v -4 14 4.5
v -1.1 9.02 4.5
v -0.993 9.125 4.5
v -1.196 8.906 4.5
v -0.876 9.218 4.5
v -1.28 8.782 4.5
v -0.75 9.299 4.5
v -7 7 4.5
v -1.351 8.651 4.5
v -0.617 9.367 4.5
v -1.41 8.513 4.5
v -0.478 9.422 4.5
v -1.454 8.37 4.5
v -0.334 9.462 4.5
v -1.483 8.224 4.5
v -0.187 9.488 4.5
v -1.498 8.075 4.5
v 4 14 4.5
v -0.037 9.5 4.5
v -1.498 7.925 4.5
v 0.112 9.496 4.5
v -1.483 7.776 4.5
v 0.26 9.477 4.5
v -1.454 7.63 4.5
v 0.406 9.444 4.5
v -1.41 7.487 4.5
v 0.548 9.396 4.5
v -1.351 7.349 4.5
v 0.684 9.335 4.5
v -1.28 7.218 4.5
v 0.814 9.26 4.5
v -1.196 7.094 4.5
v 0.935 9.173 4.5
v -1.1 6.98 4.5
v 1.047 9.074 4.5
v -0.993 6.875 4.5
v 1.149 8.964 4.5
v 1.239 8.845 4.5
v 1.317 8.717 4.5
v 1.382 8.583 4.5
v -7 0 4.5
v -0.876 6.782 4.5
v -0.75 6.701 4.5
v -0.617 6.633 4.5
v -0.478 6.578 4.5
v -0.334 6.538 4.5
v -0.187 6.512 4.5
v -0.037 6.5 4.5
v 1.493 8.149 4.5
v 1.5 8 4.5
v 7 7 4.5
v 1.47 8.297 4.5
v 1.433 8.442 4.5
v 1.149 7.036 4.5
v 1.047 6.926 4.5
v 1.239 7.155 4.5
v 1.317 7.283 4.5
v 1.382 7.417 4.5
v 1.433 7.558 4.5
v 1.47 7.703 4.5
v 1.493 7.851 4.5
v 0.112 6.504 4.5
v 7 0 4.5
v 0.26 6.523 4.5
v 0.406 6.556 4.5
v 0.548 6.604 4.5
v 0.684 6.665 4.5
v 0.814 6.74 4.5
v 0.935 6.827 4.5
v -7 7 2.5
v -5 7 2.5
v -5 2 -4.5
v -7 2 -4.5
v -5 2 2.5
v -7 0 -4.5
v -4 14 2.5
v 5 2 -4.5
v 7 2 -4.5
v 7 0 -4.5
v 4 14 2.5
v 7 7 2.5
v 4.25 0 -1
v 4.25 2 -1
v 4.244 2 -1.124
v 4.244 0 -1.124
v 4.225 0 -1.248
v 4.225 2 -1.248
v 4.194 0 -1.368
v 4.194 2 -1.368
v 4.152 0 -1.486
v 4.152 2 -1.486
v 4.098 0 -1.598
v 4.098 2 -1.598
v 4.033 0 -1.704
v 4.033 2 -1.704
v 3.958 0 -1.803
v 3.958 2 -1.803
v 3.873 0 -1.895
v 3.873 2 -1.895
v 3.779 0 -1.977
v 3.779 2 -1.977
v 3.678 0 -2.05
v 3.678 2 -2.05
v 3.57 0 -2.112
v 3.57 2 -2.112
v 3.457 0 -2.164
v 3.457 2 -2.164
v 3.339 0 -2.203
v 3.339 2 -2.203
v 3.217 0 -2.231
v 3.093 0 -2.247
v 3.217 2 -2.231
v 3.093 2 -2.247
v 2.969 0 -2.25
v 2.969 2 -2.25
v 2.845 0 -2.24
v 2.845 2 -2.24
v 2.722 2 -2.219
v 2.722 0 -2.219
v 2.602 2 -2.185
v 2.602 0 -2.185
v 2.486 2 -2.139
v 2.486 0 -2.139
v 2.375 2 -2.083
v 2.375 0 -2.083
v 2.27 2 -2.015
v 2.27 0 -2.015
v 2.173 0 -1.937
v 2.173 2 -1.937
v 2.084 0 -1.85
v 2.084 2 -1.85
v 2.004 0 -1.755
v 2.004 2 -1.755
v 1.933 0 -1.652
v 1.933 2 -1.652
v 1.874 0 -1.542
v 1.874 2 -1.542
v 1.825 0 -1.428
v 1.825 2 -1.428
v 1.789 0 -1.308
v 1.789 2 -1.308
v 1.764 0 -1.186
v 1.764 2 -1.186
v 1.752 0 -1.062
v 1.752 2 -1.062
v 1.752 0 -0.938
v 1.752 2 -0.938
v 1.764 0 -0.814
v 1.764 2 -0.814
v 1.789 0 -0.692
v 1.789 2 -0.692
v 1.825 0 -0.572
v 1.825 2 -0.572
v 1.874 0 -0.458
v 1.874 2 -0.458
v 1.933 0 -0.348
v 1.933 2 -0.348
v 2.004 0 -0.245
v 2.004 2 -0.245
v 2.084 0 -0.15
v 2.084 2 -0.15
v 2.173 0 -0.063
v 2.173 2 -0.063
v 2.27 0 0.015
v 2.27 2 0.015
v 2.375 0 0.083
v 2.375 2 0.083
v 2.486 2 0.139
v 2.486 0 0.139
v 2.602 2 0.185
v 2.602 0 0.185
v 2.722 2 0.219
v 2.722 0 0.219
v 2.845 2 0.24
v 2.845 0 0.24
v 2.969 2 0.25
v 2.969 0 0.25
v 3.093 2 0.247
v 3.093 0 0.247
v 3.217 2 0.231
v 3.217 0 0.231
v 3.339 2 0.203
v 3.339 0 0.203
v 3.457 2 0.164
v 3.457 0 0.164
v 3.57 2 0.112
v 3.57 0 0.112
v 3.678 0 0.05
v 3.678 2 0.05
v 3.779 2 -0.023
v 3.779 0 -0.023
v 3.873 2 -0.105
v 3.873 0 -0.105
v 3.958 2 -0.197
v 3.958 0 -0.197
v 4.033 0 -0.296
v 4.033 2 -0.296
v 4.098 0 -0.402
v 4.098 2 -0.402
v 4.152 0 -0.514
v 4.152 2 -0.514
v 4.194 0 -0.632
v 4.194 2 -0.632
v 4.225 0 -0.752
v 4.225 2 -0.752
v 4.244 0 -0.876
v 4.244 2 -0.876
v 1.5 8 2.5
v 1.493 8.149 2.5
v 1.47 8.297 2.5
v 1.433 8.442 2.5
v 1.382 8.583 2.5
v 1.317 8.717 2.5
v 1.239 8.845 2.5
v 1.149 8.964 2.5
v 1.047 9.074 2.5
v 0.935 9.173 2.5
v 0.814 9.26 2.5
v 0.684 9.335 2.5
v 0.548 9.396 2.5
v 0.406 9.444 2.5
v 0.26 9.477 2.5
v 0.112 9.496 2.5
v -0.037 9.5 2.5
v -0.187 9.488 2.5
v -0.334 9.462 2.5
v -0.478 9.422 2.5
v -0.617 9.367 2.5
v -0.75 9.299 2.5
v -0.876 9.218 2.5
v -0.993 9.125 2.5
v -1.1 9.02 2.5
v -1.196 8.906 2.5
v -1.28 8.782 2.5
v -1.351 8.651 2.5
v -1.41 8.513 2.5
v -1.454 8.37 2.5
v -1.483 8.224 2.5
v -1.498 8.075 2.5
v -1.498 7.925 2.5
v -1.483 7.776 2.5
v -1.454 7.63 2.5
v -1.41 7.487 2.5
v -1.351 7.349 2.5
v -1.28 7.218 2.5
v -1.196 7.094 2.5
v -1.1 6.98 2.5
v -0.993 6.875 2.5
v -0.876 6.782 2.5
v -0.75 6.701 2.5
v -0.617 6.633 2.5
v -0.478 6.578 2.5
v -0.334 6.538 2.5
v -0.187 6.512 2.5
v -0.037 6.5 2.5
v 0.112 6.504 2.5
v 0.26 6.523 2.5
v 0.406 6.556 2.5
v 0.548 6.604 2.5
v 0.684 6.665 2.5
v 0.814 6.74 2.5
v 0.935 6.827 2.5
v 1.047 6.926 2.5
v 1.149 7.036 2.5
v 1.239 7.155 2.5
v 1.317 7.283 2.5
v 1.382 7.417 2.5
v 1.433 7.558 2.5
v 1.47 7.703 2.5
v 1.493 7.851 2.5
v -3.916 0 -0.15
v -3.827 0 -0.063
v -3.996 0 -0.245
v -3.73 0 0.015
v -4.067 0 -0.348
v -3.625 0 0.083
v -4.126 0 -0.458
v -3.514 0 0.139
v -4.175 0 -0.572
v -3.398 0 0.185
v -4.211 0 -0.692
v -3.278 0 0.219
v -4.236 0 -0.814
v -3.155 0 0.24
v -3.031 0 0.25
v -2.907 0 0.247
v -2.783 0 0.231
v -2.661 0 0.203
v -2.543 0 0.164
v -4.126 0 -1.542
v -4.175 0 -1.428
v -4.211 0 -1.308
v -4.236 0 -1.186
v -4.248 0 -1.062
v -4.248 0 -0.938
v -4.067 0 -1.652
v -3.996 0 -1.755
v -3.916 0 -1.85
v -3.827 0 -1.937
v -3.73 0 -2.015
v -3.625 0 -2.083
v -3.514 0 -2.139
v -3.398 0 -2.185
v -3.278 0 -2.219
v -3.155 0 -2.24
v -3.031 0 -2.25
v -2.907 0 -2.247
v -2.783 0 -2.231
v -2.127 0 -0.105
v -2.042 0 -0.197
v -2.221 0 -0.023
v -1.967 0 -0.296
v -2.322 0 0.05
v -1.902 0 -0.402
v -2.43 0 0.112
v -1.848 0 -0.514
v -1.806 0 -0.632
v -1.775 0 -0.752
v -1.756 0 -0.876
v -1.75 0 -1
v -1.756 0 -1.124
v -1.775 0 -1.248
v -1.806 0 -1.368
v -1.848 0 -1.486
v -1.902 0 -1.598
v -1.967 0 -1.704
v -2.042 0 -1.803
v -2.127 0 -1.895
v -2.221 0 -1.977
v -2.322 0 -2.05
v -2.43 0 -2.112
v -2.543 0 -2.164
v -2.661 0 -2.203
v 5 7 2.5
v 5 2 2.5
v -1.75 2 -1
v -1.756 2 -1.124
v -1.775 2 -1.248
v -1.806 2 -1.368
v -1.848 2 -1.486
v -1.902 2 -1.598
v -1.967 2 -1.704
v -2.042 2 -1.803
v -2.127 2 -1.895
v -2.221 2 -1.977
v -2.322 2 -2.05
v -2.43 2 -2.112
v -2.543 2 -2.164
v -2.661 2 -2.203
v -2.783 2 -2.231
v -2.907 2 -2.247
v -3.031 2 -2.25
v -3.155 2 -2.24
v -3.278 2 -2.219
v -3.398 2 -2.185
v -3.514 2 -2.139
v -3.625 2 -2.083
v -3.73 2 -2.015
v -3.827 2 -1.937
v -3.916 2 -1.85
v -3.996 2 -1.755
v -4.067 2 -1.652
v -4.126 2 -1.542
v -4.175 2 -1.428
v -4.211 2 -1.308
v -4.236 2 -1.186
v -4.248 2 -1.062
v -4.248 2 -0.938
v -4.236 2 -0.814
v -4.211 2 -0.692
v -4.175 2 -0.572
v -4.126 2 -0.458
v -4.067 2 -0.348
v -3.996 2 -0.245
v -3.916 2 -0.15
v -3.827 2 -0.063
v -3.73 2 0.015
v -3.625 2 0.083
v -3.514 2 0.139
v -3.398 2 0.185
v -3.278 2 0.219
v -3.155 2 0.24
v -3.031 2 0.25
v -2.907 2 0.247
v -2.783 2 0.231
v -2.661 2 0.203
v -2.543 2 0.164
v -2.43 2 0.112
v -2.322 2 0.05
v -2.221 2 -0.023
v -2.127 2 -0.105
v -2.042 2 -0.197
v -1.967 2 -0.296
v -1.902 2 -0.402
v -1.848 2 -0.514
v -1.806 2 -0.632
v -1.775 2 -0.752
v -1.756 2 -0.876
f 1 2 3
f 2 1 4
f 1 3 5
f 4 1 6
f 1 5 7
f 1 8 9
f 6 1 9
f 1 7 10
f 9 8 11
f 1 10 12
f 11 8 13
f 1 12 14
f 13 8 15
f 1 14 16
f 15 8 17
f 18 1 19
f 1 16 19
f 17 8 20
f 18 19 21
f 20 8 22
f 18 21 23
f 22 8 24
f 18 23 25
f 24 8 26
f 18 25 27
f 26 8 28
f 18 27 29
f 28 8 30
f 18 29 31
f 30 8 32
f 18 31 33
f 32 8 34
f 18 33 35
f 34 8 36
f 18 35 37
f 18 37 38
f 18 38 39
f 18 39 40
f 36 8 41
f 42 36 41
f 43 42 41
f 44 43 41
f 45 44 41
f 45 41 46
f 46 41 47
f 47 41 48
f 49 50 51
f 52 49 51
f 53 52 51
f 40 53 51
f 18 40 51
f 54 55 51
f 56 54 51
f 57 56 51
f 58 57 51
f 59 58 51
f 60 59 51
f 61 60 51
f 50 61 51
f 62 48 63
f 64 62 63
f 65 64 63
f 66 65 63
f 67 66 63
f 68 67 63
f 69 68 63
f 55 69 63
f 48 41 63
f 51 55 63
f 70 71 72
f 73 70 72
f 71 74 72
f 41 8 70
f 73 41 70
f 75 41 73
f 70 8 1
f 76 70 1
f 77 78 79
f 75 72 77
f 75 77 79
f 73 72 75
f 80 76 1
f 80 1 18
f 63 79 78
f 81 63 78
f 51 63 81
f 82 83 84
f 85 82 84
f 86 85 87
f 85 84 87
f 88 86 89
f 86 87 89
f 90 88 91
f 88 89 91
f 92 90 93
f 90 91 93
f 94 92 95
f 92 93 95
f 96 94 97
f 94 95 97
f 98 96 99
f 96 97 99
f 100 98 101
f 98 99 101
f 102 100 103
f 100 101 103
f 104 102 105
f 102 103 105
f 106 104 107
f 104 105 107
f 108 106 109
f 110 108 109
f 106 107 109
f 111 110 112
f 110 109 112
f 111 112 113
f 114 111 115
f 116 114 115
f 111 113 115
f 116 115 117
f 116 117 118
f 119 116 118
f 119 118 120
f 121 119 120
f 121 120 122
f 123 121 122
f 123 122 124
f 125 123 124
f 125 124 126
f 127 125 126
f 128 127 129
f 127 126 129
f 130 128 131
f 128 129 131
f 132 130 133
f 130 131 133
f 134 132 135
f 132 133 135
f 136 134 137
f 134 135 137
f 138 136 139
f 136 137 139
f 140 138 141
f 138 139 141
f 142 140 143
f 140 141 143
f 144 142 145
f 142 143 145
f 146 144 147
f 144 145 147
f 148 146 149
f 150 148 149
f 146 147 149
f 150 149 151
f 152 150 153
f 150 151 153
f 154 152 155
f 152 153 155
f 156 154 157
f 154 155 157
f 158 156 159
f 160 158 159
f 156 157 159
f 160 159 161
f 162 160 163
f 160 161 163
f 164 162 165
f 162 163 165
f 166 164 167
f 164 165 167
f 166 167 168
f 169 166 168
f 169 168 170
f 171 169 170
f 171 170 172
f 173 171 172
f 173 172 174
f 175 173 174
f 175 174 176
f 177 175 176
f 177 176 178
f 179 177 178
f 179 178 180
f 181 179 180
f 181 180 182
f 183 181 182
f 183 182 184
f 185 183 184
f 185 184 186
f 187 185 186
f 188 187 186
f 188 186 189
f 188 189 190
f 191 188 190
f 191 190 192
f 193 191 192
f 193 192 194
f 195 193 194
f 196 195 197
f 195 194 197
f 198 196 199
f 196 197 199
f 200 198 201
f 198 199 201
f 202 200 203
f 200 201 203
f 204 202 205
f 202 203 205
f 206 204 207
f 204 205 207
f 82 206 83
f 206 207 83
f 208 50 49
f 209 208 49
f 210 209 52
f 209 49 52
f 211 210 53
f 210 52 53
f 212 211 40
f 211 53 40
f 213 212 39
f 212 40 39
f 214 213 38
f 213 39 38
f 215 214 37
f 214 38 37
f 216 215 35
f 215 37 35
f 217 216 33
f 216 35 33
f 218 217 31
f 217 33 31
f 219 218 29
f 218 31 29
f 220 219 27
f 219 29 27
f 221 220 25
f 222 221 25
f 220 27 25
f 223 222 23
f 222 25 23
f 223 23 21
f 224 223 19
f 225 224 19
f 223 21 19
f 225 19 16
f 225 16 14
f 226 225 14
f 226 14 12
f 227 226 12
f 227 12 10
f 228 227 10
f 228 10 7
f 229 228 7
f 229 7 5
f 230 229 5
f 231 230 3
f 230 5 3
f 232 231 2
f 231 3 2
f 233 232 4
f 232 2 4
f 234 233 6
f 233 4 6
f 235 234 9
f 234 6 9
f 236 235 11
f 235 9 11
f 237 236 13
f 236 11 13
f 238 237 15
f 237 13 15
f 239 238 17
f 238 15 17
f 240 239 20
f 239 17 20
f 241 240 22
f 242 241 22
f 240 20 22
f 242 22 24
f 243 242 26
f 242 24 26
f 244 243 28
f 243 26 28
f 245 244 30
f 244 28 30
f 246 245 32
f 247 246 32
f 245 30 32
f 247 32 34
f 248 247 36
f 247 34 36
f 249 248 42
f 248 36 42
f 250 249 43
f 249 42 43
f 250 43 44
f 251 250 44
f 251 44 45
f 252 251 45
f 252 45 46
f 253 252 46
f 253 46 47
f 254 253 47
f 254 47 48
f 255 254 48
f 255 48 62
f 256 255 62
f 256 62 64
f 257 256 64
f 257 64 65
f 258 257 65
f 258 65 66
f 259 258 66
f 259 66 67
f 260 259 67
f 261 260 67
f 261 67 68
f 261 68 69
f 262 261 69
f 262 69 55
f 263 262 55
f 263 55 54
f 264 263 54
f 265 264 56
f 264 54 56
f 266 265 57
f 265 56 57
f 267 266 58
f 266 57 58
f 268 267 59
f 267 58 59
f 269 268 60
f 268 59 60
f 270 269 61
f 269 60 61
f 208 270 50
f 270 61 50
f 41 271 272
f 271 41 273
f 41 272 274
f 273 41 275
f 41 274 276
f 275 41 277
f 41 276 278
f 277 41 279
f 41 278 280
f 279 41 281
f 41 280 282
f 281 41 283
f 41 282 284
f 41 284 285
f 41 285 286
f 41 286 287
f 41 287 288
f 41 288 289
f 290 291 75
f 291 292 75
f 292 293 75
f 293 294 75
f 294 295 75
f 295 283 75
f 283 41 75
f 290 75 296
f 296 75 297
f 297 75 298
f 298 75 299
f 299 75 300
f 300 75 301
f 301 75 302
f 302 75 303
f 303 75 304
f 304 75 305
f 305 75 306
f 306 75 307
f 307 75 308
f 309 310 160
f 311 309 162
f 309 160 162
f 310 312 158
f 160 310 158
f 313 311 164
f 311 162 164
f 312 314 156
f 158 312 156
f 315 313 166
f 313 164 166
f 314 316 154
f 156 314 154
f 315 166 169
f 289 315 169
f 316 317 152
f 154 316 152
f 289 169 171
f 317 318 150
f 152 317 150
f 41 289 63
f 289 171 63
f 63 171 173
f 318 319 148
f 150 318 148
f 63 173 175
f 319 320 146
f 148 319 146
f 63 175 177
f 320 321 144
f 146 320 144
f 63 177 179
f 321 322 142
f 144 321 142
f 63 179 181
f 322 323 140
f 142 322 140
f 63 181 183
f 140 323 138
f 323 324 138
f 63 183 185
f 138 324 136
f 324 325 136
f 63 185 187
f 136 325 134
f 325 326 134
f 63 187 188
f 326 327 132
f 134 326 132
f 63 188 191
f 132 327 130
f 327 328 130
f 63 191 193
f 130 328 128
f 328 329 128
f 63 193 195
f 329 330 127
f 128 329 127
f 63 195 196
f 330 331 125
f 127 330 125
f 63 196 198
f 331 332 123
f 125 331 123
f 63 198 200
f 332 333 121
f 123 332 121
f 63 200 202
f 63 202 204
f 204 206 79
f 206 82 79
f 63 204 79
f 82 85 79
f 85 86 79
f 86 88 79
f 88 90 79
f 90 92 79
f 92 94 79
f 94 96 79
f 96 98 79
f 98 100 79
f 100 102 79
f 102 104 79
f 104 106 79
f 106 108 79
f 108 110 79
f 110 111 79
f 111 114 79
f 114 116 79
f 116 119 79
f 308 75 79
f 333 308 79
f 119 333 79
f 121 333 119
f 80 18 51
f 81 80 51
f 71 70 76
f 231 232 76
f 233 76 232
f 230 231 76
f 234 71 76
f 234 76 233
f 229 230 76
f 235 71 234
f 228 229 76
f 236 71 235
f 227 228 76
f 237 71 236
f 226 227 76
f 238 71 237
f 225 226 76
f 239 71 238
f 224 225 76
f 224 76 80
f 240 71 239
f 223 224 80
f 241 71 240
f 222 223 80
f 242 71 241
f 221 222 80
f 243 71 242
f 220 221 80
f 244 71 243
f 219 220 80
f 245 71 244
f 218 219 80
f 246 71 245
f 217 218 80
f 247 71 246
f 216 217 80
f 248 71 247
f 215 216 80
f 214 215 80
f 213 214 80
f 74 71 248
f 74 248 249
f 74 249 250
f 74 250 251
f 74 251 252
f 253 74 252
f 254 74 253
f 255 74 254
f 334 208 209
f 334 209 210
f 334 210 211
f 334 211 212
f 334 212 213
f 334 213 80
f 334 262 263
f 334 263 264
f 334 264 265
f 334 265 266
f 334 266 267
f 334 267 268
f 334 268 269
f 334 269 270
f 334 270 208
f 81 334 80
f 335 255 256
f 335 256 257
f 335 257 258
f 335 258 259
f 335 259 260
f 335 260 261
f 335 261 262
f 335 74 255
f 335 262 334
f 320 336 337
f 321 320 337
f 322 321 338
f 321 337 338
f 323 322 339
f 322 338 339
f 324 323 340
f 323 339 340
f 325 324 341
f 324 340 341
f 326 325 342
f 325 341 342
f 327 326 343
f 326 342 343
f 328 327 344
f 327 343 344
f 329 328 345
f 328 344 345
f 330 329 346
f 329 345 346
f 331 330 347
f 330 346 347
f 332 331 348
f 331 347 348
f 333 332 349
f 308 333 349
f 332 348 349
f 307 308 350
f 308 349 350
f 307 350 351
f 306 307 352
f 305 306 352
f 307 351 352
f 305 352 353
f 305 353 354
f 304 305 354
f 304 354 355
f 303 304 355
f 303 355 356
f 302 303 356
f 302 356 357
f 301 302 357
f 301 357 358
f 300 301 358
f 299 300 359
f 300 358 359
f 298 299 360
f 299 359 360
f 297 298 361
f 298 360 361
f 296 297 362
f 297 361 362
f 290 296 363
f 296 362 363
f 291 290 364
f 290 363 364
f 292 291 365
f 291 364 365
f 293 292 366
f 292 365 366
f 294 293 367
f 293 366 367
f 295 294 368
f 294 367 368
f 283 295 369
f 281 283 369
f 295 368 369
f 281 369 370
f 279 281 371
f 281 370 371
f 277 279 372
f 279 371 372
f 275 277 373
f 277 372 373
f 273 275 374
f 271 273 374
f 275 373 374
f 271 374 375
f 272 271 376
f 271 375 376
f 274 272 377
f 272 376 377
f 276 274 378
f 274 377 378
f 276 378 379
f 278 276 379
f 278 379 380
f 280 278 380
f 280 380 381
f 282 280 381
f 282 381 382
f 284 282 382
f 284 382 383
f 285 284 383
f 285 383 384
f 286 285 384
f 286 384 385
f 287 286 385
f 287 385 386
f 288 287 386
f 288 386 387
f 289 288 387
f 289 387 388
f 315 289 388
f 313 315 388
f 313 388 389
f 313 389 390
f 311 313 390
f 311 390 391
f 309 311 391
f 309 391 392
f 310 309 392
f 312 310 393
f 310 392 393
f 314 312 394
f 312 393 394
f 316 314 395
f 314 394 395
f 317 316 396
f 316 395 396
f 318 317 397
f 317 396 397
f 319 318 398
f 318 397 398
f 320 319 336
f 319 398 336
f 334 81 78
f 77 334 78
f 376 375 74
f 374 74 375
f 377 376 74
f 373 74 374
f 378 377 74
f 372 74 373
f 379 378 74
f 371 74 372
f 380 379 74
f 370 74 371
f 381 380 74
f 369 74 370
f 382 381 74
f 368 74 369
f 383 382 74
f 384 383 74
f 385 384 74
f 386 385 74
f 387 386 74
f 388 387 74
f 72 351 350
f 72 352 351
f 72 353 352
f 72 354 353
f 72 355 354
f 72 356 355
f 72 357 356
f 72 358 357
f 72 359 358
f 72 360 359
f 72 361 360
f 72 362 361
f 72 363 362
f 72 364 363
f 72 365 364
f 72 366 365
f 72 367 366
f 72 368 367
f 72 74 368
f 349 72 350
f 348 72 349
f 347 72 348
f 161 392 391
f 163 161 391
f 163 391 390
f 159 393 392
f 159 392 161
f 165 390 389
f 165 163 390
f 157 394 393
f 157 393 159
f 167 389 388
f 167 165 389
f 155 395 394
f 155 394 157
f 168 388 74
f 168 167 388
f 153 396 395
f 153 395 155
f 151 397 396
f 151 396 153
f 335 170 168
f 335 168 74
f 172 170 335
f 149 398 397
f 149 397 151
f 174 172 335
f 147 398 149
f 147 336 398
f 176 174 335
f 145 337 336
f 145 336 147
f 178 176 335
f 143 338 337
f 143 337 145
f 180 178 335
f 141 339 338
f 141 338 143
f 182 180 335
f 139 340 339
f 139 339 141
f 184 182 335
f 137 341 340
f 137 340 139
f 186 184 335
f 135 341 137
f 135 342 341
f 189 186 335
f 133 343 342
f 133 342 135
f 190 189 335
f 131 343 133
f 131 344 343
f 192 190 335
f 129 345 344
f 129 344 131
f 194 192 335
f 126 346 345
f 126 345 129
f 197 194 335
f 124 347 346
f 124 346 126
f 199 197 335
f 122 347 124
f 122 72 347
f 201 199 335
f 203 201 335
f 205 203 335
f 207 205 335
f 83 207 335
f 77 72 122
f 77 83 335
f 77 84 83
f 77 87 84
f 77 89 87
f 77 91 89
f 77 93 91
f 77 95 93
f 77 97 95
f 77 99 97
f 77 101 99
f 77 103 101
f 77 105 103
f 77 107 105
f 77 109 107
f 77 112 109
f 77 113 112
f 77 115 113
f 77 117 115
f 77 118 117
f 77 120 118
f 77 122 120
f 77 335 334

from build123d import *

# Parameters (mm, degrees)
SKETCH1_W           = 14
SKETCH1_H           = 9
BOSS_EXTRUDE1_DEPTH = 2
SKETCH2_R           = 1.25
CUT_EXTRUDE1_DEPTH  = 2
SKETCH3_W           = 14
SKETCH3_H           = 2
BOSS_EXTRUDE2_DEPTH = 12
CUT_EXTRUDE2_DEPTH  = 12
SKETCH5_W           = 2
SKETCH5_H           = 5
BOSS_EXTRUDE3_DEPTH = 7
CUT_EXTRUDE3_DEPTH  = 14
SKETCH7_R           = 1.5
CUT_EXTRUDE4_DEPTH  = 2


with BuildPart() as part:
    # Sketch1 → Boss-Extrude1 (new body)
    with BuildSketch(Plane(origin=(0, 0, 0), x_dir=(1, 0, 0), z_dir=(0, 1, 0))):
        Rectangle(SKETCH1_W, SKETCH1_H)
    extrude(amount=BOSS_EXTRUDE1_DEPTH)

    # Sketch2 → Cut-Extrude1 (cut)
    with BuildSketch(Plane(origin=(0, 2, 0), x_dir=(1, 0, 0), z_dir=(0, 1, 0))):
        with Locations((-3, 1)):
            Circle(SKETCH2_R)
        with Locations((3, 1)):
            Circle(SKETCH2_R)
    extrude(amount=-CUT_EXTRUDE1_DEPTH, mode=Mode.SUBTRACT)

    # Sketch3 → Boss-Extrude2 (add)
    with BuildSketch(Plane(origin=(0, 2, 0), x_dir=(1, 0, 0), z_dir=(0, 1, 0))):
        with Locations((0, -3.5)):
            Rectangle(SKETCH3_W, SKETCH3_H)
    extrude(amount=BOSS_EXTRUDE2_DEPTH)

    # Sketch4 → Cut-Extrude2 (cut)
    with BuildSketch(Plane.XY.offset(4.5)):
        Polygon((-7, 7), (-4, 14), (-7, 14), align=None)
        Polygon((4, 14), (7, 7), (7, 14), align=None)
    extrude(amount=-CUT_EXTRUDE2_DEPTH, mode=Mode.SUBTRACT)

    # Sketch5 → Boss-Extrude3 (add)
    with BuildSketch(Plane(origin=(0, 0, 2.5), x_dir=(-1, 0, 0), z_dir=(0, 0, -1))):
        with Locations((-6, 4.5)):
            Rectangle(SKETCH5_W, SKETCH5_H)
        with Locations((6, 4.5)):
            Rectangle(SKETCH5_W, SKETCH5_H)
    extrude(amount=BOSS_EXTRUDE3_DEPTH)

    # Sketch6 → Cut-Extrude3 (cut)
    with BuildSketch(Plane(origin=(7, 0, 0), x_dir=(0, 0, -1), z_dir=(1, 0, 0))):
        Polygon((-2.5, 7), (4.5, 2), (4.5, 7), align=None)
    extrude(amount=-CUT_EXTRUDE3_DEPTH, mode=Mode.SUBTRACT)

    # Sketch7 → Cut-Extrude4 (cut)
    with BuildSketch(Plane.XY.offset(4.5)):
        with Locations((0, 8)):
            Circle(SKETCH7_R)
    extrude(amount=-CUT_EXTRUDE4_DEPTH, mode=Mode.SUBTRACT)


solid = part.part
